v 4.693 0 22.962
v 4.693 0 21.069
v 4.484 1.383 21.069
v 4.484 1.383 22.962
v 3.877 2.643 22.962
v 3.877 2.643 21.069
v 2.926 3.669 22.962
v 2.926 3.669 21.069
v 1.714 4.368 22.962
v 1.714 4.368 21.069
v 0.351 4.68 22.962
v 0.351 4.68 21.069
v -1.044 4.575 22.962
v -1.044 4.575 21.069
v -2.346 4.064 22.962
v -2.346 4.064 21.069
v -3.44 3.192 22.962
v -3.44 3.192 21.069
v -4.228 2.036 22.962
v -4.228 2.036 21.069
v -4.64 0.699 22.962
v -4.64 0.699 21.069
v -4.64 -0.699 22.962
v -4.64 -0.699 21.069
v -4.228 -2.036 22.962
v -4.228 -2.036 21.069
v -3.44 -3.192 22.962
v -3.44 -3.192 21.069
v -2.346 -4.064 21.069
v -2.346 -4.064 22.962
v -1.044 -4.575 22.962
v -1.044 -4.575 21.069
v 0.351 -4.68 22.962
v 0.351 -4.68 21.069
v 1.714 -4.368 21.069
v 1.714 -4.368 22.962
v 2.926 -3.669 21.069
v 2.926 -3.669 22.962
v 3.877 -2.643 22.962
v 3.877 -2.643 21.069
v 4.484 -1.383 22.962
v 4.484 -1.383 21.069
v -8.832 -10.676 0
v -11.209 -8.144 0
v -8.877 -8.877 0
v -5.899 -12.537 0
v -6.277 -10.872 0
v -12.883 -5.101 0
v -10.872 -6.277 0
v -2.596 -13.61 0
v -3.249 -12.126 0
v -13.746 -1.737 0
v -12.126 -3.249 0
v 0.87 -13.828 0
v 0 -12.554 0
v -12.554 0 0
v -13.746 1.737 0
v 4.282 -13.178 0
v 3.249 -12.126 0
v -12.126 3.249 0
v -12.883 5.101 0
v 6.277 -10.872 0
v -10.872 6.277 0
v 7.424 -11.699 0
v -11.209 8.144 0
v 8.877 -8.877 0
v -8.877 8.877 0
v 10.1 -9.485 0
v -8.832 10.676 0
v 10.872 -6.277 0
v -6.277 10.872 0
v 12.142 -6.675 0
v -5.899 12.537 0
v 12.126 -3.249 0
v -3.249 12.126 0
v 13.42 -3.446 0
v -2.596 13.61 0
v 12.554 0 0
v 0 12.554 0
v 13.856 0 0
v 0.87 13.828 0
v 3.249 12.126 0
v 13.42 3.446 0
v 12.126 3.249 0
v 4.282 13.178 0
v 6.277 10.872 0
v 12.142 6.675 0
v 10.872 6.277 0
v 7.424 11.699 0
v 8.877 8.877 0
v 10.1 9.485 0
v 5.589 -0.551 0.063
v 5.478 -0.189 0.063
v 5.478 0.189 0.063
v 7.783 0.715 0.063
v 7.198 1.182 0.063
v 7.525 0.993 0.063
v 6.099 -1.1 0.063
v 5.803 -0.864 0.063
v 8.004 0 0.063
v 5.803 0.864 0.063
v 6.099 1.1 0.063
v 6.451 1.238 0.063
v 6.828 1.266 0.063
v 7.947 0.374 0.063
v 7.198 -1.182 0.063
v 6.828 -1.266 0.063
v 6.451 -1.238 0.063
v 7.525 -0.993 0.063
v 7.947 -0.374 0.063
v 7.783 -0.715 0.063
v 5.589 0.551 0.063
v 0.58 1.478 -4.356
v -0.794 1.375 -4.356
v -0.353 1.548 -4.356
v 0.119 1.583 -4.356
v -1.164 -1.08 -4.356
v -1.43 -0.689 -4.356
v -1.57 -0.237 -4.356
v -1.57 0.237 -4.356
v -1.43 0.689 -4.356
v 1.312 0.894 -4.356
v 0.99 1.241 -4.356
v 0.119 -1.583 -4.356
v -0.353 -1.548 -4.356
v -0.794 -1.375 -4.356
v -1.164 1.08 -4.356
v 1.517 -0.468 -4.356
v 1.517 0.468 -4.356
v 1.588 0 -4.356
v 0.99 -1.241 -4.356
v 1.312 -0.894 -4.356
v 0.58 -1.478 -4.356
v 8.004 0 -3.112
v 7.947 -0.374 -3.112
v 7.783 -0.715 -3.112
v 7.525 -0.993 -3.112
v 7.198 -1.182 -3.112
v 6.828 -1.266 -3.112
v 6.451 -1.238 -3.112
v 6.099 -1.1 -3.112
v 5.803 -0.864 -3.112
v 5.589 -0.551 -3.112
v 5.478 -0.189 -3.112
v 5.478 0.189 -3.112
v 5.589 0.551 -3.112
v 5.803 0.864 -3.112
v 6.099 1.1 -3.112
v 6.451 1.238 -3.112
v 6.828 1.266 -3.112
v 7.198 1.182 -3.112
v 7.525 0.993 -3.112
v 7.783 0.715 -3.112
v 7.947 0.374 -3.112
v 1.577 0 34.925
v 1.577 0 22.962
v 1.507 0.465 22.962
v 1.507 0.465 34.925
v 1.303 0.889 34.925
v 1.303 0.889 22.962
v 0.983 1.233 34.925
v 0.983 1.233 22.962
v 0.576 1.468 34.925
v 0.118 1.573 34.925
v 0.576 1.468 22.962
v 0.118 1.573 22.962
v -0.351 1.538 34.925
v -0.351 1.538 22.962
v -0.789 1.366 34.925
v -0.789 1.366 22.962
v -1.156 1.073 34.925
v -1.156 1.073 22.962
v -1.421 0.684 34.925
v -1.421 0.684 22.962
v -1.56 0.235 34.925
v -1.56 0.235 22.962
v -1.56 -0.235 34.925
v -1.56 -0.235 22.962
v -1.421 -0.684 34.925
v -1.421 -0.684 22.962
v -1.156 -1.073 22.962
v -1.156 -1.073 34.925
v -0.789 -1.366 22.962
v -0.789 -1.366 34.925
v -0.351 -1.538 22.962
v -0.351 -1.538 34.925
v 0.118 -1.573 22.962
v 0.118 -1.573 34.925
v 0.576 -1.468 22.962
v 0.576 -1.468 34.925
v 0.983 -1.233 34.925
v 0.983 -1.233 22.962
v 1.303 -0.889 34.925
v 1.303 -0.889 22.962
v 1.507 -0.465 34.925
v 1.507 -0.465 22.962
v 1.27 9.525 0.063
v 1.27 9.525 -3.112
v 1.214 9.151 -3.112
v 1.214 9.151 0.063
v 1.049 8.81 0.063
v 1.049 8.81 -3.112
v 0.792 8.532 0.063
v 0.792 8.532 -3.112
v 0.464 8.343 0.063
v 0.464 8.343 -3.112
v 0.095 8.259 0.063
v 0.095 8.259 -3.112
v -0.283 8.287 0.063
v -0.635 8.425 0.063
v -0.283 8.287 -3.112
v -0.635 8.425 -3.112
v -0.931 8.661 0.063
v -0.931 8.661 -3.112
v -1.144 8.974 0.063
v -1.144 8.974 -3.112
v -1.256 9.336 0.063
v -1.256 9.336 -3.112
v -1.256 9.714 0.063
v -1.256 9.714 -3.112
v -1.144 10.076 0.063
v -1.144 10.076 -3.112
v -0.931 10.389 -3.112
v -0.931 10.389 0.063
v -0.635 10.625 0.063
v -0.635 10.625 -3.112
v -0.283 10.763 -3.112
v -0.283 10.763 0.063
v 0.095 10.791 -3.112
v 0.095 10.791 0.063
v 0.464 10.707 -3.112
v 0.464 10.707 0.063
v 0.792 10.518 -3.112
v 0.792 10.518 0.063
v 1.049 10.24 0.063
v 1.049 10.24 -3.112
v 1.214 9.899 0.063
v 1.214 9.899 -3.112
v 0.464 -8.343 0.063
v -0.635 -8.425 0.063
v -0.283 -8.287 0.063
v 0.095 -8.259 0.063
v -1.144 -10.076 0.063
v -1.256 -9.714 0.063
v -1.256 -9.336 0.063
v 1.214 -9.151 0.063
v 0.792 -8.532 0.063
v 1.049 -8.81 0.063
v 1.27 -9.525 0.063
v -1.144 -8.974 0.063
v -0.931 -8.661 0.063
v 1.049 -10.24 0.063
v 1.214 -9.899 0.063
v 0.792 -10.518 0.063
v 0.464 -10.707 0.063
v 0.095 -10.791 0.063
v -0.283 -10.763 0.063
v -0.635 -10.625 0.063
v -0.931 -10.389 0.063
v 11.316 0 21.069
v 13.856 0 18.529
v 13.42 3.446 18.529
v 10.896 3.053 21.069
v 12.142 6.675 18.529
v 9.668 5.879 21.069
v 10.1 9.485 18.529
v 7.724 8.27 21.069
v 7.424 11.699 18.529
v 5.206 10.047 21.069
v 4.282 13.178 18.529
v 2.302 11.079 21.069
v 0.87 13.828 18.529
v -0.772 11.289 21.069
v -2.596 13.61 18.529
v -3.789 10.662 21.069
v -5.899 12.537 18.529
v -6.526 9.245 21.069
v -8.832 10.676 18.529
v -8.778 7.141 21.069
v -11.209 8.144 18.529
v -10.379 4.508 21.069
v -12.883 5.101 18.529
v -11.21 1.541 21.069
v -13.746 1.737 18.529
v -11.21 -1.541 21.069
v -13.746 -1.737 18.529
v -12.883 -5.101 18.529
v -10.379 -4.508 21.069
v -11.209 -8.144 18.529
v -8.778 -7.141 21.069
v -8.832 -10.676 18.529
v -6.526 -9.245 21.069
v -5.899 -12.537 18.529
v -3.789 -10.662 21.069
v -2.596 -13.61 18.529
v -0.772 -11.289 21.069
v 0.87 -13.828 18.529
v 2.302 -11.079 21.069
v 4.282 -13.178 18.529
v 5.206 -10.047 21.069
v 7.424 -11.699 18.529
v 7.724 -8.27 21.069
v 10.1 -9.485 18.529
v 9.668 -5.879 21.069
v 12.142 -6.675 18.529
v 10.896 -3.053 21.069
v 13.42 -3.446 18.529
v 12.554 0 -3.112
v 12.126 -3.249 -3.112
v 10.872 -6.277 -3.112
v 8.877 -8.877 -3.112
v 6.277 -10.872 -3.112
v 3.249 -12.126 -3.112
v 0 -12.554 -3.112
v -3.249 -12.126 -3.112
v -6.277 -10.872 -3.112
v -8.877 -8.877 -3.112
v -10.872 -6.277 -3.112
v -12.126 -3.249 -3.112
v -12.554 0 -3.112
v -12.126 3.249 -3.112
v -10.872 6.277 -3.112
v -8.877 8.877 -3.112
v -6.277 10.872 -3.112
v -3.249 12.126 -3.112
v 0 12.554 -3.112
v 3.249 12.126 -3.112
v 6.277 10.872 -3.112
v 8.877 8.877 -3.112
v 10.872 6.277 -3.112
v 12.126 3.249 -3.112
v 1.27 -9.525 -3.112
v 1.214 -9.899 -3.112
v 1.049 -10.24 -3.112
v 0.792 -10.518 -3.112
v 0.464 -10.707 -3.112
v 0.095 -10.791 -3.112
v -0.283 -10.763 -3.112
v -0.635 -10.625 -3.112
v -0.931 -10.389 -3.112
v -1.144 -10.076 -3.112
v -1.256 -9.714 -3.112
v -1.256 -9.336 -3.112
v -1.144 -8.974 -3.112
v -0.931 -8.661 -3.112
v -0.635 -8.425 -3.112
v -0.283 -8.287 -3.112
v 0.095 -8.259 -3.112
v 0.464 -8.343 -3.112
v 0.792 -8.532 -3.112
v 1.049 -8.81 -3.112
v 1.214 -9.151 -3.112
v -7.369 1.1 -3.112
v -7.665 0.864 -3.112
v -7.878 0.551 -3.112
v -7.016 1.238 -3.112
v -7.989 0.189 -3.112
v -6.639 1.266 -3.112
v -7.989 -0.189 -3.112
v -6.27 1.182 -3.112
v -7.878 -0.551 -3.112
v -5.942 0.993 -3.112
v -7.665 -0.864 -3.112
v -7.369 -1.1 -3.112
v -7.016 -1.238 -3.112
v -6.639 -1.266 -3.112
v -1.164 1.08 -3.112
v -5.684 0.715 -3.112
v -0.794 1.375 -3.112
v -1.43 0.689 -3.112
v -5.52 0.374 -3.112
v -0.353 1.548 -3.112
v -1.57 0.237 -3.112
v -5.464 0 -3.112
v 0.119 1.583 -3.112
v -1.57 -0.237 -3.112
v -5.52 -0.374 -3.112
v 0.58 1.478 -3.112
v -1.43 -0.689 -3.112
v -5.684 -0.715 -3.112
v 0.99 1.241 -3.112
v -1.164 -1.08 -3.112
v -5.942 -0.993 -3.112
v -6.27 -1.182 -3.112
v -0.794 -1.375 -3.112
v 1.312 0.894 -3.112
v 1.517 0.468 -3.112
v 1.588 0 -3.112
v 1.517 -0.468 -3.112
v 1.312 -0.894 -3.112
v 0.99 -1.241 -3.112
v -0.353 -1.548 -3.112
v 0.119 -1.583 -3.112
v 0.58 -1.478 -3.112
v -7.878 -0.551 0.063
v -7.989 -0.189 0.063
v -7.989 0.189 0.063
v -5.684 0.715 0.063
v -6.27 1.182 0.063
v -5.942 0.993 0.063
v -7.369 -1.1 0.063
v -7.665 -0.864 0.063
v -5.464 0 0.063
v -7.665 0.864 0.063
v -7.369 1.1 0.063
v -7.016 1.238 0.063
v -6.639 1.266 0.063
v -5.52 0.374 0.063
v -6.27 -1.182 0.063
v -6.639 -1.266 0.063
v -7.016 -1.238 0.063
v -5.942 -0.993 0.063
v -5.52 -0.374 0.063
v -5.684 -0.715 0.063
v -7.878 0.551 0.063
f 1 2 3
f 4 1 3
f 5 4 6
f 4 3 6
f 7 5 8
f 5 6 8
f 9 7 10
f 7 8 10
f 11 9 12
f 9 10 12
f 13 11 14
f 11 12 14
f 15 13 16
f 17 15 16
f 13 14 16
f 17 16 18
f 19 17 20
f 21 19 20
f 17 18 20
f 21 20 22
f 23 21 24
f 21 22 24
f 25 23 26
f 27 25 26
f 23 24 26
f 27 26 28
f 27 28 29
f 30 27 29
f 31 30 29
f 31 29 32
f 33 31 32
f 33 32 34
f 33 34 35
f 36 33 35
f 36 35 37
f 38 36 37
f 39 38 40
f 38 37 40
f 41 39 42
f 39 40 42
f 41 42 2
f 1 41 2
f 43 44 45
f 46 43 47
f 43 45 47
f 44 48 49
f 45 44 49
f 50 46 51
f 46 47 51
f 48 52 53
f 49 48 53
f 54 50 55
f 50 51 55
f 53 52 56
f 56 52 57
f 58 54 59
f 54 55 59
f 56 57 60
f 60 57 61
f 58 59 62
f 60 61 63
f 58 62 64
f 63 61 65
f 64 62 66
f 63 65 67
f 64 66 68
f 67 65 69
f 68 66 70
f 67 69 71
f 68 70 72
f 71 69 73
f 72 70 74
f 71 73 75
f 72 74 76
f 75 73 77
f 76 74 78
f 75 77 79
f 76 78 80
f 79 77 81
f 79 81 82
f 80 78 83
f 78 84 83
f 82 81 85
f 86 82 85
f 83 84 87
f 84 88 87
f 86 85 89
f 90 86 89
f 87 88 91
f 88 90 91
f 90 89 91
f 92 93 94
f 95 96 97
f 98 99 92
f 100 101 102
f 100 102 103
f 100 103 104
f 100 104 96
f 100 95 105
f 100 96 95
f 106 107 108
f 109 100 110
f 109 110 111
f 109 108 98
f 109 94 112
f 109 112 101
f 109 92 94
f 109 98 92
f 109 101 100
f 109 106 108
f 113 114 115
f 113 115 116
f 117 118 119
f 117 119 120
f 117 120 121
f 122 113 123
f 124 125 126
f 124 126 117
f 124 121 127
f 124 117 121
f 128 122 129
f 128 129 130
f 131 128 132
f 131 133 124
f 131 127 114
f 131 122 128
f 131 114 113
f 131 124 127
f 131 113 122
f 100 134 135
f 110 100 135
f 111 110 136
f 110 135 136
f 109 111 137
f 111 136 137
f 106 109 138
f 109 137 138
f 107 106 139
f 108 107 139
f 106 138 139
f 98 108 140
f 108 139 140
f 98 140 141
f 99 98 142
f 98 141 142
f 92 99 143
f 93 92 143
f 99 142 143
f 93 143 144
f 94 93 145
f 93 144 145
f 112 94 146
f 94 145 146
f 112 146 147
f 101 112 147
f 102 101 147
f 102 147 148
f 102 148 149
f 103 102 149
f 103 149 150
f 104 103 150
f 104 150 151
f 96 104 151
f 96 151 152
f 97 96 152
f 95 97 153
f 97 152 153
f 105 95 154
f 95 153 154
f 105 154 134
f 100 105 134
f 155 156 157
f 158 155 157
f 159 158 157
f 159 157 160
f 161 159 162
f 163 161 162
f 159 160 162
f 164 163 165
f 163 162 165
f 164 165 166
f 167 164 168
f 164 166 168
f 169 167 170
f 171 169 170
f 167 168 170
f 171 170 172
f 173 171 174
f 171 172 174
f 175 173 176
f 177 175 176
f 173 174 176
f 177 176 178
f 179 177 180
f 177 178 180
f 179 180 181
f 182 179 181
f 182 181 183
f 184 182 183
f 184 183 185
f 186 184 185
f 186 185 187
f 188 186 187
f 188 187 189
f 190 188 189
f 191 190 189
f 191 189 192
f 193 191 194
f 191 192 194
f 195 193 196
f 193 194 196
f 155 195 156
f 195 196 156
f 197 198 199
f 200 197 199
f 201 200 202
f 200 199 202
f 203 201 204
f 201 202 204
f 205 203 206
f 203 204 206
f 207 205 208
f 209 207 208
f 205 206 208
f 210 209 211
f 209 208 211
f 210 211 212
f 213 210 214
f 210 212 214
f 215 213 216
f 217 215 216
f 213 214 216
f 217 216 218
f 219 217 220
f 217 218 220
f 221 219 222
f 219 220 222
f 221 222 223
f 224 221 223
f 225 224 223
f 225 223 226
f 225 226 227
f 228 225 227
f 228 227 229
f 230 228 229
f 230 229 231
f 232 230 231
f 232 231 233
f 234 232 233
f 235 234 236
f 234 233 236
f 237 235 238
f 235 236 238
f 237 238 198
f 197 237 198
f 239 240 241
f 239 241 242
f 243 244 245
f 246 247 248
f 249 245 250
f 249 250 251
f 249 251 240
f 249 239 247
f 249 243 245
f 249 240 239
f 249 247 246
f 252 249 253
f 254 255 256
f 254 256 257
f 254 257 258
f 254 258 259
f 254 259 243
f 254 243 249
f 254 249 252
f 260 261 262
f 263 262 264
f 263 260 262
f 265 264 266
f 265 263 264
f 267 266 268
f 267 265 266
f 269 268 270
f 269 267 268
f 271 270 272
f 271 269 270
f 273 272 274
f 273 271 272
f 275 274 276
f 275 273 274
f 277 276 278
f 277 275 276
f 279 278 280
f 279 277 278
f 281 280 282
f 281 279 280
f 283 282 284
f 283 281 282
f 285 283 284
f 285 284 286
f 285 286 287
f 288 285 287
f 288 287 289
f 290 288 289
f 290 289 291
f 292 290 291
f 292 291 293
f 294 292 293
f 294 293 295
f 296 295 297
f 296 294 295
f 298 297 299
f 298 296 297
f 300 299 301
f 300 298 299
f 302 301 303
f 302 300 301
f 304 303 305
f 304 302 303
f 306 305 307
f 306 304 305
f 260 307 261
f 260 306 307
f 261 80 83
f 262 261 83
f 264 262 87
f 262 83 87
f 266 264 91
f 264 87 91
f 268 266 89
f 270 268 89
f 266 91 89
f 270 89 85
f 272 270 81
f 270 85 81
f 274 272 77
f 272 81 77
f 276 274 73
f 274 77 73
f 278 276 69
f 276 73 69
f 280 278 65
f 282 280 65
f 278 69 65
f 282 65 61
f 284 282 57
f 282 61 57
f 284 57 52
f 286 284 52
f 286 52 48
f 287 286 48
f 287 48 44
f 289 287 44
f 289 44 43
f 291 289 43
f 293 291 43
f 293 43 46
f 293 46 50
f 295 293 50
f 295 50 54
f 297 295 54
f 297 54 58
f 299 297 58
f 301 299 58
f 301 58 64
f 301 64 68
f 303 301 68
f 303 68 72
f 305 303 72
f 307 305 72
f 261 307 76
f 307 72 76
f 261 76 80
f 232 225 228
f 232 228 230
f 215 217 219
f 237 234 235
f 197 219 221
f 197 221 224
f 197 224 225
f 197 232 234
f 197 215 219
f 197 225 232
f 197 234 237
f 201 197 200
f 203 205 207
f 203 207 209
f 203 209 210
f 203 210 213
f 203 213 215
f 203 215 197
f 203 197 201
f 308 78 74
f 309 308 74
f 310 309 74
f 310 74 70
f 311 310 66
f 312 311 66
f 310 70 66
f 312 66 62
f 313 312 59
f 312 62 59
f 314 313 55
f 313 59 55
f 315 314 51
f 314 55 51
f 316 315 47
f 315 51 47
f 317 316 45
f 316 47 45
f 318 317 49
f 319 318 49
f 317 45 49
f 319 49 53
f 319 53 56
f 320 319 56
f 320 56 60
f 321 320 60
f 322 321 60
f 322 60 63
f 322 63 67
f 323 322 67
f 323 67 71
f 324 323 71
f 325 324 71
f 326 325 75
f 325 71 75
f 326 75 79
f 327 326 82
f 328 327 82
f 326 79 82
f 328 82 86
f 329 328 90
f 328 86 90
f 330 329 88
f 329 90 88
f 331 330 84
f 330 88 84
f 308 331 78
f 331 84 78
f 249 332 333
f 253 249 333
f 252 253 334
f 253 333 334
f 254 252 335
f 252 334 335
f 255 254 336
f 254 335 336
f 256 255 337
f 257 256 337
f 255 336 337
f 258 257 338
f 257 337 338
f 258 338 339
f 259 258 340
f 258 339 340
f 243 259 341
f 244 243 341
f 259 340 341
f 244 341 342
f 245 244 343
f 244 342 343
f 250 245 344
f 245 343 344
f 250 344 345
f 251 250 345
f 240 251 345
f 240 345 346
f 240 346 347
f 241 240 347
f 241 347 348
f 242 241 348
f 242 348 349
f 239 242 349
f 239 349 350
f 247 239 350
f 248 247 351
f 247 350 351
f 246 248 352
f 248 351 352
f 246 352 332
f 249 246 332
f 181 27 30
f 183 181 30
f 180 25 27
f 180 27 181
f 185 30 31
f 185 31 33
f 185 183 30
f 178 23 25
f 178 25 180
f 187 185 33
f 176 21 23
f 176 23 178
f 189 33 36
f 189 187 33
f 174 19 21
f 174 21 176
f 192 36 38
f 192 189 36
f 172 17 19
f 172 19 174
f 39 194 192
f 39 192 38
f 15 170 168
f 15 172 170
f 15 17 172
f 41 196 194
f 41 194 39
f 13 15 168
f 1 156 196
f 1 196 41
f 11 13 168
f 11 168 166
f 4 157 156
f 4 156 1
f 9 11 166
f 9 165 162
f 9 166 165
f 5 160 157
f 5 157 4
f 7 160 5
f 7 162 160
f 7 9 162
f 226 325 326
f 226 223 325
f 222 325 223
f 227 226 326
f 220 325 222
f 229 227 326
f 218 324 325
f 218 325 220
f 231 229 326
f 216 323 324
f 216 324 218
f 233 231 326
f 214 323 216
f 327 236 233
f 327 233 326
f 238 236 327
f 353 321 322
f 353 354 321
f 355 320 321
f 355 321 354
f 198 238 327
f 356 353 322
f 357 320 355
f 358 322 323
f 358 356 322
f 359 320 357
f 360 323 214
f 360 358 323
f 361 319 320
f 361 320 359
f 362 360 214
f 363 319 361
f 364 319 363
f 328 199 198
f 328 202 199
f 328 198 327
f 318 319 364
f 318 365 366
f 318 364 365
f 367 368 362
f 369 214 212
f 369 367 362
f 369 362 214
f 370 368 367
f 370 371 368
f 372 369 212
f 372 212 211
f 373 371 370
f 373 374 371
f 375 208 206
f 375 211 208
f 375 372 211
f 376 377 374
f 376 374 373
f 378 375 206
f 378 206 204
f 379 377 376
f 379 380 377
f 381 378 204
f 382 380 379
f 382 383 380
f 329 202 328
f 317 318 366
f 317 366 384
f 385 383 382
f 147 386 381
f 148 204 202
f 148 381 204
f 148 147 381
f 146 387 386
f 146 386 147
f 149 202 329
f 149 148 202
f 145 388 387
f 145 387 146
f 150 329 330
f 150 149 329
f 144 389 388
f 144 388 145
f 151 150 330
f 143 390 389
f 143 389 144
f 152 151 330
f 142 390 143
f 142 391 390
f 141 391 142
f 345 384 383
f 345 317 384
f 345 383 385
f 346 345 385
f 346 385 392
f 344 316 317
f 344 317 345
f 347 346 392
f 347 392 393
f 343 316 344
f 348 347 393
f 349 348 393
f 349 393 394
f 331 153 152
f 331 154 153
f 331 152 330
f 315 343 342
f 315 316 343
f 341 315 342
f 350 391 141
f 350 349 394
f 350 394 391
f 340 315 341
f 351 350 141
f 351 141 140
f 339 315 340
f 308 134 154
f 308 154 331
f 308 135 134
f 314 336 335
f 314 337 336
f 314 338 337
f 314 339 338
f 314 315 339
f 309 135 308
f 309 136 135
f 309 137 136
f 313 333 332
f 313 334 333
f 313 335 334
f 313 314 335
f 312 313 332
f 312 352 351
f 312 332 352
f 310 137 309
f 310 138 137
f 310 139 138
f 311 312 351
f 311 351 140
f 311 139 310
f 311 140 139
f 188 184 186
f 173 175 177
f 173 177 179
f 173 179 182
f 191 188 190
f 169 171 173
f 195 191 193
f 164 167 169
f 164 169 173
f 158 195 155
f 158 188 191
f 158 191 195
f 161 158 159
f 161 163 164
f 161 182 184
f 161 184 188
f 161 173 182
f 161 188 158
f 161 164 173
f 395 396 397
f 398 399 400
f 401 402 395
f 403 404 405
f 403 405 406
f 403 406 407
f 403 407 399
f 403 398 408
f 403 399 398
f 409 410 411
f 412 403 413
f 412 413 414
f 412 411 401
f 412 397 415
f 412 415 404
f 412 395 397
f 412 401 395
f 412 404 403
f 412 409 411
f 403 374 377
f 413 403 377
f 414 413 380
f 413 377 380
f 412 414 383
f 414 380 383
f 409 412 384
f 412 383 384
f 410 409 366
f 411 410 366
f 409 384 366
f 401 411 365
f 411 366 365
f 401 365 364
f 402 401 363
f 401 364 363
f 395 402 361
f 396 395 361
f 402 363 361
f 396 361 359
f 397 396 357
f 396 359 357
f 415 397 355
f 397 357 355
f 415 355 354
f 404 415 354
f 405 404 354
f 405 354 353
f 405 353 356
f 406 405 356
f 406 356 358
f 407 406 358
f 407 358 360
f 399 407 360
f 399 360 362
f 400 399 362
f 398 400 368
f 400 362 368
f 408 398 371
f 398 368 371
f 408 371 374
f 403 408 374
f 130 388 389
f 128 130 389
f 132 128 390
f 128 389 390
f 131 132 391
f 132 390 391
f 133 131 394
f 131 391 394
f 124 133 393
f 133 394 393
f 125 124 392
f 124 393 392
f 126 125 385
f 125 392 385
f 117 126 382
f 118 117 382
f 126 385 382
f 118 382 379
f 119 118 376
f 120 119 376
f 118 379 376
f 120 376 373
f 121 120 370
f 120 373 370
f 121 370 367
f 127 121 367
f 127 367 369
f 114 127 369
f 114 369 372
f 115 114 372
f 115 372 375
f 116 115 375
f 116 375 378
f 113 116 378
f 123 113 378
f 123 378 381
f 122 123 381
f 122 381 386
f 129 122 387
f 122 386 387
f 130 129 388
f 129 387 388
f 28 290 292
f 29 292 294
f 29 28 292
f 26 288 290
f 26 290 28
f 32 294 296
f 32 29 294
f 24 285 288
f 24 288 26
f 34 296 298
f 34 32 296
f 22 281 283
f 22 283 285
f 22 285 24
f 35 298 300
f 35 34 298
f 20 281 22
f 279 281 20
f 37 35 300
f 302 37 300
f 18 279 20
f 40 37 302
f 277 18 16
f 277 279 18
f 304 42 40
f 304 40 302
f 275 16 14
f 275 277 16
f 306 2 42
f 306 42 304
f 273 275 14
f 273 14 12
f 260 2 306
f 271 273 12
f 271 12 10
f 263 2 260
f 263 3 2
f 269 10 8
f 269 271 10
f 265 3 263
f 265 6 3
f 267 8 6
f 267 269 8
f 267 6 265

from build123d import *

# Parameters (mm, degrees)
SKETCH_R     = 13.8557
PAD_DEPTH    = 18.3515
SKETCH001_R  = 12.55395
PAD001_DEPTH = 3.1115
SKETCH002_R  = 13.8557
PAD002_DEPTH = 2.7178
CHAMFER_SIZE = 2.54
SKETCH003_R  = 4.69265
PAD003_DEPTH = 1.8923
SKETCH004_R  = 1.57734
PAD004_DEPTH = 11.9634
SKETCH005_R  = 1.27
POCKET_DEPTH = 3.175
SKETCH006_R  = 1.5875
PAD005_DEPTH = 1.2446


with BuildPart() as part:
    # Sketch → Pad (new body)
    with BuildSketch(Plane.XY):
        Circle(SKETCH_R)
    extrude(amount=PAD_DEPTH)

    # Sketch001 → Pad001 (new body)
    with BuildSketch(Plane(origin=(0, 0, 0), x_dir=(1, 0, 0), z_dir=(0, 0, -1))):
        Circle(SKETCH001_R)
    extrude(amount=PAD001_DEPTH)

    # Sketch002 → Pad002 (new body)
    with BuildSketch(Plane.XY.offset(18.3515)):
        Circle(SKETCH002_R)
    extrude(amount=PAD002_DEPTH)

    # Chamfer
    chamfer_edges = [part.edges().sort_by_distance(p)[0] for p in [
        (-13.8557, 0, 21.0693),
    ]]
    chamfer(chamfer_edges, length=CHAMFER_SIZE)

    # Sketch003 → Pad003 (new body)
    with BuildSketch(Plane.XY.offset(21.0693)):
        Circle(SKETCH003_R)
    extrude(amount=PAD003_DEPTH)

    # Sketch004 → Pad004 (new body)
    with BuildSketch(Plane.XY.offset(22.9616)):
        Circle(SKETCH004_R)
    extrude(amount=PAD004_DEPTH)

    # Sketch005 → Pocket (cut)
    with BuildSketch(Plane(origin=(0, 0, -3.1115), x_dir=(1, 0, 0), z_dir=(0, 0, -1))):
        with Locations((6.73354, 0)):
            Circle(SKETCH005_R)
        with Locations((-6.73354, 0)):
            Circle(SKETCH005_R)
        with Locations((0, 9.525)):
            Circle(SKETCH005_R)
        with Locations((0, -9.525)):
            Circle(SKETCH005_R)
    extrude(amount=-POCKET_DEPTH, mode=Mode.SUBTRACT)

    # Sketch006 → Pad005 (new body)
    with BuildSketch(Plane(origin=(0, 0, -3.1115), x_dir=(1, 0, 0), z_dir=(0, 0, -1))):
        Circle(SKETCH006_R)
    extrude(amount=PAD005_DEPTH)


solid = part.part
